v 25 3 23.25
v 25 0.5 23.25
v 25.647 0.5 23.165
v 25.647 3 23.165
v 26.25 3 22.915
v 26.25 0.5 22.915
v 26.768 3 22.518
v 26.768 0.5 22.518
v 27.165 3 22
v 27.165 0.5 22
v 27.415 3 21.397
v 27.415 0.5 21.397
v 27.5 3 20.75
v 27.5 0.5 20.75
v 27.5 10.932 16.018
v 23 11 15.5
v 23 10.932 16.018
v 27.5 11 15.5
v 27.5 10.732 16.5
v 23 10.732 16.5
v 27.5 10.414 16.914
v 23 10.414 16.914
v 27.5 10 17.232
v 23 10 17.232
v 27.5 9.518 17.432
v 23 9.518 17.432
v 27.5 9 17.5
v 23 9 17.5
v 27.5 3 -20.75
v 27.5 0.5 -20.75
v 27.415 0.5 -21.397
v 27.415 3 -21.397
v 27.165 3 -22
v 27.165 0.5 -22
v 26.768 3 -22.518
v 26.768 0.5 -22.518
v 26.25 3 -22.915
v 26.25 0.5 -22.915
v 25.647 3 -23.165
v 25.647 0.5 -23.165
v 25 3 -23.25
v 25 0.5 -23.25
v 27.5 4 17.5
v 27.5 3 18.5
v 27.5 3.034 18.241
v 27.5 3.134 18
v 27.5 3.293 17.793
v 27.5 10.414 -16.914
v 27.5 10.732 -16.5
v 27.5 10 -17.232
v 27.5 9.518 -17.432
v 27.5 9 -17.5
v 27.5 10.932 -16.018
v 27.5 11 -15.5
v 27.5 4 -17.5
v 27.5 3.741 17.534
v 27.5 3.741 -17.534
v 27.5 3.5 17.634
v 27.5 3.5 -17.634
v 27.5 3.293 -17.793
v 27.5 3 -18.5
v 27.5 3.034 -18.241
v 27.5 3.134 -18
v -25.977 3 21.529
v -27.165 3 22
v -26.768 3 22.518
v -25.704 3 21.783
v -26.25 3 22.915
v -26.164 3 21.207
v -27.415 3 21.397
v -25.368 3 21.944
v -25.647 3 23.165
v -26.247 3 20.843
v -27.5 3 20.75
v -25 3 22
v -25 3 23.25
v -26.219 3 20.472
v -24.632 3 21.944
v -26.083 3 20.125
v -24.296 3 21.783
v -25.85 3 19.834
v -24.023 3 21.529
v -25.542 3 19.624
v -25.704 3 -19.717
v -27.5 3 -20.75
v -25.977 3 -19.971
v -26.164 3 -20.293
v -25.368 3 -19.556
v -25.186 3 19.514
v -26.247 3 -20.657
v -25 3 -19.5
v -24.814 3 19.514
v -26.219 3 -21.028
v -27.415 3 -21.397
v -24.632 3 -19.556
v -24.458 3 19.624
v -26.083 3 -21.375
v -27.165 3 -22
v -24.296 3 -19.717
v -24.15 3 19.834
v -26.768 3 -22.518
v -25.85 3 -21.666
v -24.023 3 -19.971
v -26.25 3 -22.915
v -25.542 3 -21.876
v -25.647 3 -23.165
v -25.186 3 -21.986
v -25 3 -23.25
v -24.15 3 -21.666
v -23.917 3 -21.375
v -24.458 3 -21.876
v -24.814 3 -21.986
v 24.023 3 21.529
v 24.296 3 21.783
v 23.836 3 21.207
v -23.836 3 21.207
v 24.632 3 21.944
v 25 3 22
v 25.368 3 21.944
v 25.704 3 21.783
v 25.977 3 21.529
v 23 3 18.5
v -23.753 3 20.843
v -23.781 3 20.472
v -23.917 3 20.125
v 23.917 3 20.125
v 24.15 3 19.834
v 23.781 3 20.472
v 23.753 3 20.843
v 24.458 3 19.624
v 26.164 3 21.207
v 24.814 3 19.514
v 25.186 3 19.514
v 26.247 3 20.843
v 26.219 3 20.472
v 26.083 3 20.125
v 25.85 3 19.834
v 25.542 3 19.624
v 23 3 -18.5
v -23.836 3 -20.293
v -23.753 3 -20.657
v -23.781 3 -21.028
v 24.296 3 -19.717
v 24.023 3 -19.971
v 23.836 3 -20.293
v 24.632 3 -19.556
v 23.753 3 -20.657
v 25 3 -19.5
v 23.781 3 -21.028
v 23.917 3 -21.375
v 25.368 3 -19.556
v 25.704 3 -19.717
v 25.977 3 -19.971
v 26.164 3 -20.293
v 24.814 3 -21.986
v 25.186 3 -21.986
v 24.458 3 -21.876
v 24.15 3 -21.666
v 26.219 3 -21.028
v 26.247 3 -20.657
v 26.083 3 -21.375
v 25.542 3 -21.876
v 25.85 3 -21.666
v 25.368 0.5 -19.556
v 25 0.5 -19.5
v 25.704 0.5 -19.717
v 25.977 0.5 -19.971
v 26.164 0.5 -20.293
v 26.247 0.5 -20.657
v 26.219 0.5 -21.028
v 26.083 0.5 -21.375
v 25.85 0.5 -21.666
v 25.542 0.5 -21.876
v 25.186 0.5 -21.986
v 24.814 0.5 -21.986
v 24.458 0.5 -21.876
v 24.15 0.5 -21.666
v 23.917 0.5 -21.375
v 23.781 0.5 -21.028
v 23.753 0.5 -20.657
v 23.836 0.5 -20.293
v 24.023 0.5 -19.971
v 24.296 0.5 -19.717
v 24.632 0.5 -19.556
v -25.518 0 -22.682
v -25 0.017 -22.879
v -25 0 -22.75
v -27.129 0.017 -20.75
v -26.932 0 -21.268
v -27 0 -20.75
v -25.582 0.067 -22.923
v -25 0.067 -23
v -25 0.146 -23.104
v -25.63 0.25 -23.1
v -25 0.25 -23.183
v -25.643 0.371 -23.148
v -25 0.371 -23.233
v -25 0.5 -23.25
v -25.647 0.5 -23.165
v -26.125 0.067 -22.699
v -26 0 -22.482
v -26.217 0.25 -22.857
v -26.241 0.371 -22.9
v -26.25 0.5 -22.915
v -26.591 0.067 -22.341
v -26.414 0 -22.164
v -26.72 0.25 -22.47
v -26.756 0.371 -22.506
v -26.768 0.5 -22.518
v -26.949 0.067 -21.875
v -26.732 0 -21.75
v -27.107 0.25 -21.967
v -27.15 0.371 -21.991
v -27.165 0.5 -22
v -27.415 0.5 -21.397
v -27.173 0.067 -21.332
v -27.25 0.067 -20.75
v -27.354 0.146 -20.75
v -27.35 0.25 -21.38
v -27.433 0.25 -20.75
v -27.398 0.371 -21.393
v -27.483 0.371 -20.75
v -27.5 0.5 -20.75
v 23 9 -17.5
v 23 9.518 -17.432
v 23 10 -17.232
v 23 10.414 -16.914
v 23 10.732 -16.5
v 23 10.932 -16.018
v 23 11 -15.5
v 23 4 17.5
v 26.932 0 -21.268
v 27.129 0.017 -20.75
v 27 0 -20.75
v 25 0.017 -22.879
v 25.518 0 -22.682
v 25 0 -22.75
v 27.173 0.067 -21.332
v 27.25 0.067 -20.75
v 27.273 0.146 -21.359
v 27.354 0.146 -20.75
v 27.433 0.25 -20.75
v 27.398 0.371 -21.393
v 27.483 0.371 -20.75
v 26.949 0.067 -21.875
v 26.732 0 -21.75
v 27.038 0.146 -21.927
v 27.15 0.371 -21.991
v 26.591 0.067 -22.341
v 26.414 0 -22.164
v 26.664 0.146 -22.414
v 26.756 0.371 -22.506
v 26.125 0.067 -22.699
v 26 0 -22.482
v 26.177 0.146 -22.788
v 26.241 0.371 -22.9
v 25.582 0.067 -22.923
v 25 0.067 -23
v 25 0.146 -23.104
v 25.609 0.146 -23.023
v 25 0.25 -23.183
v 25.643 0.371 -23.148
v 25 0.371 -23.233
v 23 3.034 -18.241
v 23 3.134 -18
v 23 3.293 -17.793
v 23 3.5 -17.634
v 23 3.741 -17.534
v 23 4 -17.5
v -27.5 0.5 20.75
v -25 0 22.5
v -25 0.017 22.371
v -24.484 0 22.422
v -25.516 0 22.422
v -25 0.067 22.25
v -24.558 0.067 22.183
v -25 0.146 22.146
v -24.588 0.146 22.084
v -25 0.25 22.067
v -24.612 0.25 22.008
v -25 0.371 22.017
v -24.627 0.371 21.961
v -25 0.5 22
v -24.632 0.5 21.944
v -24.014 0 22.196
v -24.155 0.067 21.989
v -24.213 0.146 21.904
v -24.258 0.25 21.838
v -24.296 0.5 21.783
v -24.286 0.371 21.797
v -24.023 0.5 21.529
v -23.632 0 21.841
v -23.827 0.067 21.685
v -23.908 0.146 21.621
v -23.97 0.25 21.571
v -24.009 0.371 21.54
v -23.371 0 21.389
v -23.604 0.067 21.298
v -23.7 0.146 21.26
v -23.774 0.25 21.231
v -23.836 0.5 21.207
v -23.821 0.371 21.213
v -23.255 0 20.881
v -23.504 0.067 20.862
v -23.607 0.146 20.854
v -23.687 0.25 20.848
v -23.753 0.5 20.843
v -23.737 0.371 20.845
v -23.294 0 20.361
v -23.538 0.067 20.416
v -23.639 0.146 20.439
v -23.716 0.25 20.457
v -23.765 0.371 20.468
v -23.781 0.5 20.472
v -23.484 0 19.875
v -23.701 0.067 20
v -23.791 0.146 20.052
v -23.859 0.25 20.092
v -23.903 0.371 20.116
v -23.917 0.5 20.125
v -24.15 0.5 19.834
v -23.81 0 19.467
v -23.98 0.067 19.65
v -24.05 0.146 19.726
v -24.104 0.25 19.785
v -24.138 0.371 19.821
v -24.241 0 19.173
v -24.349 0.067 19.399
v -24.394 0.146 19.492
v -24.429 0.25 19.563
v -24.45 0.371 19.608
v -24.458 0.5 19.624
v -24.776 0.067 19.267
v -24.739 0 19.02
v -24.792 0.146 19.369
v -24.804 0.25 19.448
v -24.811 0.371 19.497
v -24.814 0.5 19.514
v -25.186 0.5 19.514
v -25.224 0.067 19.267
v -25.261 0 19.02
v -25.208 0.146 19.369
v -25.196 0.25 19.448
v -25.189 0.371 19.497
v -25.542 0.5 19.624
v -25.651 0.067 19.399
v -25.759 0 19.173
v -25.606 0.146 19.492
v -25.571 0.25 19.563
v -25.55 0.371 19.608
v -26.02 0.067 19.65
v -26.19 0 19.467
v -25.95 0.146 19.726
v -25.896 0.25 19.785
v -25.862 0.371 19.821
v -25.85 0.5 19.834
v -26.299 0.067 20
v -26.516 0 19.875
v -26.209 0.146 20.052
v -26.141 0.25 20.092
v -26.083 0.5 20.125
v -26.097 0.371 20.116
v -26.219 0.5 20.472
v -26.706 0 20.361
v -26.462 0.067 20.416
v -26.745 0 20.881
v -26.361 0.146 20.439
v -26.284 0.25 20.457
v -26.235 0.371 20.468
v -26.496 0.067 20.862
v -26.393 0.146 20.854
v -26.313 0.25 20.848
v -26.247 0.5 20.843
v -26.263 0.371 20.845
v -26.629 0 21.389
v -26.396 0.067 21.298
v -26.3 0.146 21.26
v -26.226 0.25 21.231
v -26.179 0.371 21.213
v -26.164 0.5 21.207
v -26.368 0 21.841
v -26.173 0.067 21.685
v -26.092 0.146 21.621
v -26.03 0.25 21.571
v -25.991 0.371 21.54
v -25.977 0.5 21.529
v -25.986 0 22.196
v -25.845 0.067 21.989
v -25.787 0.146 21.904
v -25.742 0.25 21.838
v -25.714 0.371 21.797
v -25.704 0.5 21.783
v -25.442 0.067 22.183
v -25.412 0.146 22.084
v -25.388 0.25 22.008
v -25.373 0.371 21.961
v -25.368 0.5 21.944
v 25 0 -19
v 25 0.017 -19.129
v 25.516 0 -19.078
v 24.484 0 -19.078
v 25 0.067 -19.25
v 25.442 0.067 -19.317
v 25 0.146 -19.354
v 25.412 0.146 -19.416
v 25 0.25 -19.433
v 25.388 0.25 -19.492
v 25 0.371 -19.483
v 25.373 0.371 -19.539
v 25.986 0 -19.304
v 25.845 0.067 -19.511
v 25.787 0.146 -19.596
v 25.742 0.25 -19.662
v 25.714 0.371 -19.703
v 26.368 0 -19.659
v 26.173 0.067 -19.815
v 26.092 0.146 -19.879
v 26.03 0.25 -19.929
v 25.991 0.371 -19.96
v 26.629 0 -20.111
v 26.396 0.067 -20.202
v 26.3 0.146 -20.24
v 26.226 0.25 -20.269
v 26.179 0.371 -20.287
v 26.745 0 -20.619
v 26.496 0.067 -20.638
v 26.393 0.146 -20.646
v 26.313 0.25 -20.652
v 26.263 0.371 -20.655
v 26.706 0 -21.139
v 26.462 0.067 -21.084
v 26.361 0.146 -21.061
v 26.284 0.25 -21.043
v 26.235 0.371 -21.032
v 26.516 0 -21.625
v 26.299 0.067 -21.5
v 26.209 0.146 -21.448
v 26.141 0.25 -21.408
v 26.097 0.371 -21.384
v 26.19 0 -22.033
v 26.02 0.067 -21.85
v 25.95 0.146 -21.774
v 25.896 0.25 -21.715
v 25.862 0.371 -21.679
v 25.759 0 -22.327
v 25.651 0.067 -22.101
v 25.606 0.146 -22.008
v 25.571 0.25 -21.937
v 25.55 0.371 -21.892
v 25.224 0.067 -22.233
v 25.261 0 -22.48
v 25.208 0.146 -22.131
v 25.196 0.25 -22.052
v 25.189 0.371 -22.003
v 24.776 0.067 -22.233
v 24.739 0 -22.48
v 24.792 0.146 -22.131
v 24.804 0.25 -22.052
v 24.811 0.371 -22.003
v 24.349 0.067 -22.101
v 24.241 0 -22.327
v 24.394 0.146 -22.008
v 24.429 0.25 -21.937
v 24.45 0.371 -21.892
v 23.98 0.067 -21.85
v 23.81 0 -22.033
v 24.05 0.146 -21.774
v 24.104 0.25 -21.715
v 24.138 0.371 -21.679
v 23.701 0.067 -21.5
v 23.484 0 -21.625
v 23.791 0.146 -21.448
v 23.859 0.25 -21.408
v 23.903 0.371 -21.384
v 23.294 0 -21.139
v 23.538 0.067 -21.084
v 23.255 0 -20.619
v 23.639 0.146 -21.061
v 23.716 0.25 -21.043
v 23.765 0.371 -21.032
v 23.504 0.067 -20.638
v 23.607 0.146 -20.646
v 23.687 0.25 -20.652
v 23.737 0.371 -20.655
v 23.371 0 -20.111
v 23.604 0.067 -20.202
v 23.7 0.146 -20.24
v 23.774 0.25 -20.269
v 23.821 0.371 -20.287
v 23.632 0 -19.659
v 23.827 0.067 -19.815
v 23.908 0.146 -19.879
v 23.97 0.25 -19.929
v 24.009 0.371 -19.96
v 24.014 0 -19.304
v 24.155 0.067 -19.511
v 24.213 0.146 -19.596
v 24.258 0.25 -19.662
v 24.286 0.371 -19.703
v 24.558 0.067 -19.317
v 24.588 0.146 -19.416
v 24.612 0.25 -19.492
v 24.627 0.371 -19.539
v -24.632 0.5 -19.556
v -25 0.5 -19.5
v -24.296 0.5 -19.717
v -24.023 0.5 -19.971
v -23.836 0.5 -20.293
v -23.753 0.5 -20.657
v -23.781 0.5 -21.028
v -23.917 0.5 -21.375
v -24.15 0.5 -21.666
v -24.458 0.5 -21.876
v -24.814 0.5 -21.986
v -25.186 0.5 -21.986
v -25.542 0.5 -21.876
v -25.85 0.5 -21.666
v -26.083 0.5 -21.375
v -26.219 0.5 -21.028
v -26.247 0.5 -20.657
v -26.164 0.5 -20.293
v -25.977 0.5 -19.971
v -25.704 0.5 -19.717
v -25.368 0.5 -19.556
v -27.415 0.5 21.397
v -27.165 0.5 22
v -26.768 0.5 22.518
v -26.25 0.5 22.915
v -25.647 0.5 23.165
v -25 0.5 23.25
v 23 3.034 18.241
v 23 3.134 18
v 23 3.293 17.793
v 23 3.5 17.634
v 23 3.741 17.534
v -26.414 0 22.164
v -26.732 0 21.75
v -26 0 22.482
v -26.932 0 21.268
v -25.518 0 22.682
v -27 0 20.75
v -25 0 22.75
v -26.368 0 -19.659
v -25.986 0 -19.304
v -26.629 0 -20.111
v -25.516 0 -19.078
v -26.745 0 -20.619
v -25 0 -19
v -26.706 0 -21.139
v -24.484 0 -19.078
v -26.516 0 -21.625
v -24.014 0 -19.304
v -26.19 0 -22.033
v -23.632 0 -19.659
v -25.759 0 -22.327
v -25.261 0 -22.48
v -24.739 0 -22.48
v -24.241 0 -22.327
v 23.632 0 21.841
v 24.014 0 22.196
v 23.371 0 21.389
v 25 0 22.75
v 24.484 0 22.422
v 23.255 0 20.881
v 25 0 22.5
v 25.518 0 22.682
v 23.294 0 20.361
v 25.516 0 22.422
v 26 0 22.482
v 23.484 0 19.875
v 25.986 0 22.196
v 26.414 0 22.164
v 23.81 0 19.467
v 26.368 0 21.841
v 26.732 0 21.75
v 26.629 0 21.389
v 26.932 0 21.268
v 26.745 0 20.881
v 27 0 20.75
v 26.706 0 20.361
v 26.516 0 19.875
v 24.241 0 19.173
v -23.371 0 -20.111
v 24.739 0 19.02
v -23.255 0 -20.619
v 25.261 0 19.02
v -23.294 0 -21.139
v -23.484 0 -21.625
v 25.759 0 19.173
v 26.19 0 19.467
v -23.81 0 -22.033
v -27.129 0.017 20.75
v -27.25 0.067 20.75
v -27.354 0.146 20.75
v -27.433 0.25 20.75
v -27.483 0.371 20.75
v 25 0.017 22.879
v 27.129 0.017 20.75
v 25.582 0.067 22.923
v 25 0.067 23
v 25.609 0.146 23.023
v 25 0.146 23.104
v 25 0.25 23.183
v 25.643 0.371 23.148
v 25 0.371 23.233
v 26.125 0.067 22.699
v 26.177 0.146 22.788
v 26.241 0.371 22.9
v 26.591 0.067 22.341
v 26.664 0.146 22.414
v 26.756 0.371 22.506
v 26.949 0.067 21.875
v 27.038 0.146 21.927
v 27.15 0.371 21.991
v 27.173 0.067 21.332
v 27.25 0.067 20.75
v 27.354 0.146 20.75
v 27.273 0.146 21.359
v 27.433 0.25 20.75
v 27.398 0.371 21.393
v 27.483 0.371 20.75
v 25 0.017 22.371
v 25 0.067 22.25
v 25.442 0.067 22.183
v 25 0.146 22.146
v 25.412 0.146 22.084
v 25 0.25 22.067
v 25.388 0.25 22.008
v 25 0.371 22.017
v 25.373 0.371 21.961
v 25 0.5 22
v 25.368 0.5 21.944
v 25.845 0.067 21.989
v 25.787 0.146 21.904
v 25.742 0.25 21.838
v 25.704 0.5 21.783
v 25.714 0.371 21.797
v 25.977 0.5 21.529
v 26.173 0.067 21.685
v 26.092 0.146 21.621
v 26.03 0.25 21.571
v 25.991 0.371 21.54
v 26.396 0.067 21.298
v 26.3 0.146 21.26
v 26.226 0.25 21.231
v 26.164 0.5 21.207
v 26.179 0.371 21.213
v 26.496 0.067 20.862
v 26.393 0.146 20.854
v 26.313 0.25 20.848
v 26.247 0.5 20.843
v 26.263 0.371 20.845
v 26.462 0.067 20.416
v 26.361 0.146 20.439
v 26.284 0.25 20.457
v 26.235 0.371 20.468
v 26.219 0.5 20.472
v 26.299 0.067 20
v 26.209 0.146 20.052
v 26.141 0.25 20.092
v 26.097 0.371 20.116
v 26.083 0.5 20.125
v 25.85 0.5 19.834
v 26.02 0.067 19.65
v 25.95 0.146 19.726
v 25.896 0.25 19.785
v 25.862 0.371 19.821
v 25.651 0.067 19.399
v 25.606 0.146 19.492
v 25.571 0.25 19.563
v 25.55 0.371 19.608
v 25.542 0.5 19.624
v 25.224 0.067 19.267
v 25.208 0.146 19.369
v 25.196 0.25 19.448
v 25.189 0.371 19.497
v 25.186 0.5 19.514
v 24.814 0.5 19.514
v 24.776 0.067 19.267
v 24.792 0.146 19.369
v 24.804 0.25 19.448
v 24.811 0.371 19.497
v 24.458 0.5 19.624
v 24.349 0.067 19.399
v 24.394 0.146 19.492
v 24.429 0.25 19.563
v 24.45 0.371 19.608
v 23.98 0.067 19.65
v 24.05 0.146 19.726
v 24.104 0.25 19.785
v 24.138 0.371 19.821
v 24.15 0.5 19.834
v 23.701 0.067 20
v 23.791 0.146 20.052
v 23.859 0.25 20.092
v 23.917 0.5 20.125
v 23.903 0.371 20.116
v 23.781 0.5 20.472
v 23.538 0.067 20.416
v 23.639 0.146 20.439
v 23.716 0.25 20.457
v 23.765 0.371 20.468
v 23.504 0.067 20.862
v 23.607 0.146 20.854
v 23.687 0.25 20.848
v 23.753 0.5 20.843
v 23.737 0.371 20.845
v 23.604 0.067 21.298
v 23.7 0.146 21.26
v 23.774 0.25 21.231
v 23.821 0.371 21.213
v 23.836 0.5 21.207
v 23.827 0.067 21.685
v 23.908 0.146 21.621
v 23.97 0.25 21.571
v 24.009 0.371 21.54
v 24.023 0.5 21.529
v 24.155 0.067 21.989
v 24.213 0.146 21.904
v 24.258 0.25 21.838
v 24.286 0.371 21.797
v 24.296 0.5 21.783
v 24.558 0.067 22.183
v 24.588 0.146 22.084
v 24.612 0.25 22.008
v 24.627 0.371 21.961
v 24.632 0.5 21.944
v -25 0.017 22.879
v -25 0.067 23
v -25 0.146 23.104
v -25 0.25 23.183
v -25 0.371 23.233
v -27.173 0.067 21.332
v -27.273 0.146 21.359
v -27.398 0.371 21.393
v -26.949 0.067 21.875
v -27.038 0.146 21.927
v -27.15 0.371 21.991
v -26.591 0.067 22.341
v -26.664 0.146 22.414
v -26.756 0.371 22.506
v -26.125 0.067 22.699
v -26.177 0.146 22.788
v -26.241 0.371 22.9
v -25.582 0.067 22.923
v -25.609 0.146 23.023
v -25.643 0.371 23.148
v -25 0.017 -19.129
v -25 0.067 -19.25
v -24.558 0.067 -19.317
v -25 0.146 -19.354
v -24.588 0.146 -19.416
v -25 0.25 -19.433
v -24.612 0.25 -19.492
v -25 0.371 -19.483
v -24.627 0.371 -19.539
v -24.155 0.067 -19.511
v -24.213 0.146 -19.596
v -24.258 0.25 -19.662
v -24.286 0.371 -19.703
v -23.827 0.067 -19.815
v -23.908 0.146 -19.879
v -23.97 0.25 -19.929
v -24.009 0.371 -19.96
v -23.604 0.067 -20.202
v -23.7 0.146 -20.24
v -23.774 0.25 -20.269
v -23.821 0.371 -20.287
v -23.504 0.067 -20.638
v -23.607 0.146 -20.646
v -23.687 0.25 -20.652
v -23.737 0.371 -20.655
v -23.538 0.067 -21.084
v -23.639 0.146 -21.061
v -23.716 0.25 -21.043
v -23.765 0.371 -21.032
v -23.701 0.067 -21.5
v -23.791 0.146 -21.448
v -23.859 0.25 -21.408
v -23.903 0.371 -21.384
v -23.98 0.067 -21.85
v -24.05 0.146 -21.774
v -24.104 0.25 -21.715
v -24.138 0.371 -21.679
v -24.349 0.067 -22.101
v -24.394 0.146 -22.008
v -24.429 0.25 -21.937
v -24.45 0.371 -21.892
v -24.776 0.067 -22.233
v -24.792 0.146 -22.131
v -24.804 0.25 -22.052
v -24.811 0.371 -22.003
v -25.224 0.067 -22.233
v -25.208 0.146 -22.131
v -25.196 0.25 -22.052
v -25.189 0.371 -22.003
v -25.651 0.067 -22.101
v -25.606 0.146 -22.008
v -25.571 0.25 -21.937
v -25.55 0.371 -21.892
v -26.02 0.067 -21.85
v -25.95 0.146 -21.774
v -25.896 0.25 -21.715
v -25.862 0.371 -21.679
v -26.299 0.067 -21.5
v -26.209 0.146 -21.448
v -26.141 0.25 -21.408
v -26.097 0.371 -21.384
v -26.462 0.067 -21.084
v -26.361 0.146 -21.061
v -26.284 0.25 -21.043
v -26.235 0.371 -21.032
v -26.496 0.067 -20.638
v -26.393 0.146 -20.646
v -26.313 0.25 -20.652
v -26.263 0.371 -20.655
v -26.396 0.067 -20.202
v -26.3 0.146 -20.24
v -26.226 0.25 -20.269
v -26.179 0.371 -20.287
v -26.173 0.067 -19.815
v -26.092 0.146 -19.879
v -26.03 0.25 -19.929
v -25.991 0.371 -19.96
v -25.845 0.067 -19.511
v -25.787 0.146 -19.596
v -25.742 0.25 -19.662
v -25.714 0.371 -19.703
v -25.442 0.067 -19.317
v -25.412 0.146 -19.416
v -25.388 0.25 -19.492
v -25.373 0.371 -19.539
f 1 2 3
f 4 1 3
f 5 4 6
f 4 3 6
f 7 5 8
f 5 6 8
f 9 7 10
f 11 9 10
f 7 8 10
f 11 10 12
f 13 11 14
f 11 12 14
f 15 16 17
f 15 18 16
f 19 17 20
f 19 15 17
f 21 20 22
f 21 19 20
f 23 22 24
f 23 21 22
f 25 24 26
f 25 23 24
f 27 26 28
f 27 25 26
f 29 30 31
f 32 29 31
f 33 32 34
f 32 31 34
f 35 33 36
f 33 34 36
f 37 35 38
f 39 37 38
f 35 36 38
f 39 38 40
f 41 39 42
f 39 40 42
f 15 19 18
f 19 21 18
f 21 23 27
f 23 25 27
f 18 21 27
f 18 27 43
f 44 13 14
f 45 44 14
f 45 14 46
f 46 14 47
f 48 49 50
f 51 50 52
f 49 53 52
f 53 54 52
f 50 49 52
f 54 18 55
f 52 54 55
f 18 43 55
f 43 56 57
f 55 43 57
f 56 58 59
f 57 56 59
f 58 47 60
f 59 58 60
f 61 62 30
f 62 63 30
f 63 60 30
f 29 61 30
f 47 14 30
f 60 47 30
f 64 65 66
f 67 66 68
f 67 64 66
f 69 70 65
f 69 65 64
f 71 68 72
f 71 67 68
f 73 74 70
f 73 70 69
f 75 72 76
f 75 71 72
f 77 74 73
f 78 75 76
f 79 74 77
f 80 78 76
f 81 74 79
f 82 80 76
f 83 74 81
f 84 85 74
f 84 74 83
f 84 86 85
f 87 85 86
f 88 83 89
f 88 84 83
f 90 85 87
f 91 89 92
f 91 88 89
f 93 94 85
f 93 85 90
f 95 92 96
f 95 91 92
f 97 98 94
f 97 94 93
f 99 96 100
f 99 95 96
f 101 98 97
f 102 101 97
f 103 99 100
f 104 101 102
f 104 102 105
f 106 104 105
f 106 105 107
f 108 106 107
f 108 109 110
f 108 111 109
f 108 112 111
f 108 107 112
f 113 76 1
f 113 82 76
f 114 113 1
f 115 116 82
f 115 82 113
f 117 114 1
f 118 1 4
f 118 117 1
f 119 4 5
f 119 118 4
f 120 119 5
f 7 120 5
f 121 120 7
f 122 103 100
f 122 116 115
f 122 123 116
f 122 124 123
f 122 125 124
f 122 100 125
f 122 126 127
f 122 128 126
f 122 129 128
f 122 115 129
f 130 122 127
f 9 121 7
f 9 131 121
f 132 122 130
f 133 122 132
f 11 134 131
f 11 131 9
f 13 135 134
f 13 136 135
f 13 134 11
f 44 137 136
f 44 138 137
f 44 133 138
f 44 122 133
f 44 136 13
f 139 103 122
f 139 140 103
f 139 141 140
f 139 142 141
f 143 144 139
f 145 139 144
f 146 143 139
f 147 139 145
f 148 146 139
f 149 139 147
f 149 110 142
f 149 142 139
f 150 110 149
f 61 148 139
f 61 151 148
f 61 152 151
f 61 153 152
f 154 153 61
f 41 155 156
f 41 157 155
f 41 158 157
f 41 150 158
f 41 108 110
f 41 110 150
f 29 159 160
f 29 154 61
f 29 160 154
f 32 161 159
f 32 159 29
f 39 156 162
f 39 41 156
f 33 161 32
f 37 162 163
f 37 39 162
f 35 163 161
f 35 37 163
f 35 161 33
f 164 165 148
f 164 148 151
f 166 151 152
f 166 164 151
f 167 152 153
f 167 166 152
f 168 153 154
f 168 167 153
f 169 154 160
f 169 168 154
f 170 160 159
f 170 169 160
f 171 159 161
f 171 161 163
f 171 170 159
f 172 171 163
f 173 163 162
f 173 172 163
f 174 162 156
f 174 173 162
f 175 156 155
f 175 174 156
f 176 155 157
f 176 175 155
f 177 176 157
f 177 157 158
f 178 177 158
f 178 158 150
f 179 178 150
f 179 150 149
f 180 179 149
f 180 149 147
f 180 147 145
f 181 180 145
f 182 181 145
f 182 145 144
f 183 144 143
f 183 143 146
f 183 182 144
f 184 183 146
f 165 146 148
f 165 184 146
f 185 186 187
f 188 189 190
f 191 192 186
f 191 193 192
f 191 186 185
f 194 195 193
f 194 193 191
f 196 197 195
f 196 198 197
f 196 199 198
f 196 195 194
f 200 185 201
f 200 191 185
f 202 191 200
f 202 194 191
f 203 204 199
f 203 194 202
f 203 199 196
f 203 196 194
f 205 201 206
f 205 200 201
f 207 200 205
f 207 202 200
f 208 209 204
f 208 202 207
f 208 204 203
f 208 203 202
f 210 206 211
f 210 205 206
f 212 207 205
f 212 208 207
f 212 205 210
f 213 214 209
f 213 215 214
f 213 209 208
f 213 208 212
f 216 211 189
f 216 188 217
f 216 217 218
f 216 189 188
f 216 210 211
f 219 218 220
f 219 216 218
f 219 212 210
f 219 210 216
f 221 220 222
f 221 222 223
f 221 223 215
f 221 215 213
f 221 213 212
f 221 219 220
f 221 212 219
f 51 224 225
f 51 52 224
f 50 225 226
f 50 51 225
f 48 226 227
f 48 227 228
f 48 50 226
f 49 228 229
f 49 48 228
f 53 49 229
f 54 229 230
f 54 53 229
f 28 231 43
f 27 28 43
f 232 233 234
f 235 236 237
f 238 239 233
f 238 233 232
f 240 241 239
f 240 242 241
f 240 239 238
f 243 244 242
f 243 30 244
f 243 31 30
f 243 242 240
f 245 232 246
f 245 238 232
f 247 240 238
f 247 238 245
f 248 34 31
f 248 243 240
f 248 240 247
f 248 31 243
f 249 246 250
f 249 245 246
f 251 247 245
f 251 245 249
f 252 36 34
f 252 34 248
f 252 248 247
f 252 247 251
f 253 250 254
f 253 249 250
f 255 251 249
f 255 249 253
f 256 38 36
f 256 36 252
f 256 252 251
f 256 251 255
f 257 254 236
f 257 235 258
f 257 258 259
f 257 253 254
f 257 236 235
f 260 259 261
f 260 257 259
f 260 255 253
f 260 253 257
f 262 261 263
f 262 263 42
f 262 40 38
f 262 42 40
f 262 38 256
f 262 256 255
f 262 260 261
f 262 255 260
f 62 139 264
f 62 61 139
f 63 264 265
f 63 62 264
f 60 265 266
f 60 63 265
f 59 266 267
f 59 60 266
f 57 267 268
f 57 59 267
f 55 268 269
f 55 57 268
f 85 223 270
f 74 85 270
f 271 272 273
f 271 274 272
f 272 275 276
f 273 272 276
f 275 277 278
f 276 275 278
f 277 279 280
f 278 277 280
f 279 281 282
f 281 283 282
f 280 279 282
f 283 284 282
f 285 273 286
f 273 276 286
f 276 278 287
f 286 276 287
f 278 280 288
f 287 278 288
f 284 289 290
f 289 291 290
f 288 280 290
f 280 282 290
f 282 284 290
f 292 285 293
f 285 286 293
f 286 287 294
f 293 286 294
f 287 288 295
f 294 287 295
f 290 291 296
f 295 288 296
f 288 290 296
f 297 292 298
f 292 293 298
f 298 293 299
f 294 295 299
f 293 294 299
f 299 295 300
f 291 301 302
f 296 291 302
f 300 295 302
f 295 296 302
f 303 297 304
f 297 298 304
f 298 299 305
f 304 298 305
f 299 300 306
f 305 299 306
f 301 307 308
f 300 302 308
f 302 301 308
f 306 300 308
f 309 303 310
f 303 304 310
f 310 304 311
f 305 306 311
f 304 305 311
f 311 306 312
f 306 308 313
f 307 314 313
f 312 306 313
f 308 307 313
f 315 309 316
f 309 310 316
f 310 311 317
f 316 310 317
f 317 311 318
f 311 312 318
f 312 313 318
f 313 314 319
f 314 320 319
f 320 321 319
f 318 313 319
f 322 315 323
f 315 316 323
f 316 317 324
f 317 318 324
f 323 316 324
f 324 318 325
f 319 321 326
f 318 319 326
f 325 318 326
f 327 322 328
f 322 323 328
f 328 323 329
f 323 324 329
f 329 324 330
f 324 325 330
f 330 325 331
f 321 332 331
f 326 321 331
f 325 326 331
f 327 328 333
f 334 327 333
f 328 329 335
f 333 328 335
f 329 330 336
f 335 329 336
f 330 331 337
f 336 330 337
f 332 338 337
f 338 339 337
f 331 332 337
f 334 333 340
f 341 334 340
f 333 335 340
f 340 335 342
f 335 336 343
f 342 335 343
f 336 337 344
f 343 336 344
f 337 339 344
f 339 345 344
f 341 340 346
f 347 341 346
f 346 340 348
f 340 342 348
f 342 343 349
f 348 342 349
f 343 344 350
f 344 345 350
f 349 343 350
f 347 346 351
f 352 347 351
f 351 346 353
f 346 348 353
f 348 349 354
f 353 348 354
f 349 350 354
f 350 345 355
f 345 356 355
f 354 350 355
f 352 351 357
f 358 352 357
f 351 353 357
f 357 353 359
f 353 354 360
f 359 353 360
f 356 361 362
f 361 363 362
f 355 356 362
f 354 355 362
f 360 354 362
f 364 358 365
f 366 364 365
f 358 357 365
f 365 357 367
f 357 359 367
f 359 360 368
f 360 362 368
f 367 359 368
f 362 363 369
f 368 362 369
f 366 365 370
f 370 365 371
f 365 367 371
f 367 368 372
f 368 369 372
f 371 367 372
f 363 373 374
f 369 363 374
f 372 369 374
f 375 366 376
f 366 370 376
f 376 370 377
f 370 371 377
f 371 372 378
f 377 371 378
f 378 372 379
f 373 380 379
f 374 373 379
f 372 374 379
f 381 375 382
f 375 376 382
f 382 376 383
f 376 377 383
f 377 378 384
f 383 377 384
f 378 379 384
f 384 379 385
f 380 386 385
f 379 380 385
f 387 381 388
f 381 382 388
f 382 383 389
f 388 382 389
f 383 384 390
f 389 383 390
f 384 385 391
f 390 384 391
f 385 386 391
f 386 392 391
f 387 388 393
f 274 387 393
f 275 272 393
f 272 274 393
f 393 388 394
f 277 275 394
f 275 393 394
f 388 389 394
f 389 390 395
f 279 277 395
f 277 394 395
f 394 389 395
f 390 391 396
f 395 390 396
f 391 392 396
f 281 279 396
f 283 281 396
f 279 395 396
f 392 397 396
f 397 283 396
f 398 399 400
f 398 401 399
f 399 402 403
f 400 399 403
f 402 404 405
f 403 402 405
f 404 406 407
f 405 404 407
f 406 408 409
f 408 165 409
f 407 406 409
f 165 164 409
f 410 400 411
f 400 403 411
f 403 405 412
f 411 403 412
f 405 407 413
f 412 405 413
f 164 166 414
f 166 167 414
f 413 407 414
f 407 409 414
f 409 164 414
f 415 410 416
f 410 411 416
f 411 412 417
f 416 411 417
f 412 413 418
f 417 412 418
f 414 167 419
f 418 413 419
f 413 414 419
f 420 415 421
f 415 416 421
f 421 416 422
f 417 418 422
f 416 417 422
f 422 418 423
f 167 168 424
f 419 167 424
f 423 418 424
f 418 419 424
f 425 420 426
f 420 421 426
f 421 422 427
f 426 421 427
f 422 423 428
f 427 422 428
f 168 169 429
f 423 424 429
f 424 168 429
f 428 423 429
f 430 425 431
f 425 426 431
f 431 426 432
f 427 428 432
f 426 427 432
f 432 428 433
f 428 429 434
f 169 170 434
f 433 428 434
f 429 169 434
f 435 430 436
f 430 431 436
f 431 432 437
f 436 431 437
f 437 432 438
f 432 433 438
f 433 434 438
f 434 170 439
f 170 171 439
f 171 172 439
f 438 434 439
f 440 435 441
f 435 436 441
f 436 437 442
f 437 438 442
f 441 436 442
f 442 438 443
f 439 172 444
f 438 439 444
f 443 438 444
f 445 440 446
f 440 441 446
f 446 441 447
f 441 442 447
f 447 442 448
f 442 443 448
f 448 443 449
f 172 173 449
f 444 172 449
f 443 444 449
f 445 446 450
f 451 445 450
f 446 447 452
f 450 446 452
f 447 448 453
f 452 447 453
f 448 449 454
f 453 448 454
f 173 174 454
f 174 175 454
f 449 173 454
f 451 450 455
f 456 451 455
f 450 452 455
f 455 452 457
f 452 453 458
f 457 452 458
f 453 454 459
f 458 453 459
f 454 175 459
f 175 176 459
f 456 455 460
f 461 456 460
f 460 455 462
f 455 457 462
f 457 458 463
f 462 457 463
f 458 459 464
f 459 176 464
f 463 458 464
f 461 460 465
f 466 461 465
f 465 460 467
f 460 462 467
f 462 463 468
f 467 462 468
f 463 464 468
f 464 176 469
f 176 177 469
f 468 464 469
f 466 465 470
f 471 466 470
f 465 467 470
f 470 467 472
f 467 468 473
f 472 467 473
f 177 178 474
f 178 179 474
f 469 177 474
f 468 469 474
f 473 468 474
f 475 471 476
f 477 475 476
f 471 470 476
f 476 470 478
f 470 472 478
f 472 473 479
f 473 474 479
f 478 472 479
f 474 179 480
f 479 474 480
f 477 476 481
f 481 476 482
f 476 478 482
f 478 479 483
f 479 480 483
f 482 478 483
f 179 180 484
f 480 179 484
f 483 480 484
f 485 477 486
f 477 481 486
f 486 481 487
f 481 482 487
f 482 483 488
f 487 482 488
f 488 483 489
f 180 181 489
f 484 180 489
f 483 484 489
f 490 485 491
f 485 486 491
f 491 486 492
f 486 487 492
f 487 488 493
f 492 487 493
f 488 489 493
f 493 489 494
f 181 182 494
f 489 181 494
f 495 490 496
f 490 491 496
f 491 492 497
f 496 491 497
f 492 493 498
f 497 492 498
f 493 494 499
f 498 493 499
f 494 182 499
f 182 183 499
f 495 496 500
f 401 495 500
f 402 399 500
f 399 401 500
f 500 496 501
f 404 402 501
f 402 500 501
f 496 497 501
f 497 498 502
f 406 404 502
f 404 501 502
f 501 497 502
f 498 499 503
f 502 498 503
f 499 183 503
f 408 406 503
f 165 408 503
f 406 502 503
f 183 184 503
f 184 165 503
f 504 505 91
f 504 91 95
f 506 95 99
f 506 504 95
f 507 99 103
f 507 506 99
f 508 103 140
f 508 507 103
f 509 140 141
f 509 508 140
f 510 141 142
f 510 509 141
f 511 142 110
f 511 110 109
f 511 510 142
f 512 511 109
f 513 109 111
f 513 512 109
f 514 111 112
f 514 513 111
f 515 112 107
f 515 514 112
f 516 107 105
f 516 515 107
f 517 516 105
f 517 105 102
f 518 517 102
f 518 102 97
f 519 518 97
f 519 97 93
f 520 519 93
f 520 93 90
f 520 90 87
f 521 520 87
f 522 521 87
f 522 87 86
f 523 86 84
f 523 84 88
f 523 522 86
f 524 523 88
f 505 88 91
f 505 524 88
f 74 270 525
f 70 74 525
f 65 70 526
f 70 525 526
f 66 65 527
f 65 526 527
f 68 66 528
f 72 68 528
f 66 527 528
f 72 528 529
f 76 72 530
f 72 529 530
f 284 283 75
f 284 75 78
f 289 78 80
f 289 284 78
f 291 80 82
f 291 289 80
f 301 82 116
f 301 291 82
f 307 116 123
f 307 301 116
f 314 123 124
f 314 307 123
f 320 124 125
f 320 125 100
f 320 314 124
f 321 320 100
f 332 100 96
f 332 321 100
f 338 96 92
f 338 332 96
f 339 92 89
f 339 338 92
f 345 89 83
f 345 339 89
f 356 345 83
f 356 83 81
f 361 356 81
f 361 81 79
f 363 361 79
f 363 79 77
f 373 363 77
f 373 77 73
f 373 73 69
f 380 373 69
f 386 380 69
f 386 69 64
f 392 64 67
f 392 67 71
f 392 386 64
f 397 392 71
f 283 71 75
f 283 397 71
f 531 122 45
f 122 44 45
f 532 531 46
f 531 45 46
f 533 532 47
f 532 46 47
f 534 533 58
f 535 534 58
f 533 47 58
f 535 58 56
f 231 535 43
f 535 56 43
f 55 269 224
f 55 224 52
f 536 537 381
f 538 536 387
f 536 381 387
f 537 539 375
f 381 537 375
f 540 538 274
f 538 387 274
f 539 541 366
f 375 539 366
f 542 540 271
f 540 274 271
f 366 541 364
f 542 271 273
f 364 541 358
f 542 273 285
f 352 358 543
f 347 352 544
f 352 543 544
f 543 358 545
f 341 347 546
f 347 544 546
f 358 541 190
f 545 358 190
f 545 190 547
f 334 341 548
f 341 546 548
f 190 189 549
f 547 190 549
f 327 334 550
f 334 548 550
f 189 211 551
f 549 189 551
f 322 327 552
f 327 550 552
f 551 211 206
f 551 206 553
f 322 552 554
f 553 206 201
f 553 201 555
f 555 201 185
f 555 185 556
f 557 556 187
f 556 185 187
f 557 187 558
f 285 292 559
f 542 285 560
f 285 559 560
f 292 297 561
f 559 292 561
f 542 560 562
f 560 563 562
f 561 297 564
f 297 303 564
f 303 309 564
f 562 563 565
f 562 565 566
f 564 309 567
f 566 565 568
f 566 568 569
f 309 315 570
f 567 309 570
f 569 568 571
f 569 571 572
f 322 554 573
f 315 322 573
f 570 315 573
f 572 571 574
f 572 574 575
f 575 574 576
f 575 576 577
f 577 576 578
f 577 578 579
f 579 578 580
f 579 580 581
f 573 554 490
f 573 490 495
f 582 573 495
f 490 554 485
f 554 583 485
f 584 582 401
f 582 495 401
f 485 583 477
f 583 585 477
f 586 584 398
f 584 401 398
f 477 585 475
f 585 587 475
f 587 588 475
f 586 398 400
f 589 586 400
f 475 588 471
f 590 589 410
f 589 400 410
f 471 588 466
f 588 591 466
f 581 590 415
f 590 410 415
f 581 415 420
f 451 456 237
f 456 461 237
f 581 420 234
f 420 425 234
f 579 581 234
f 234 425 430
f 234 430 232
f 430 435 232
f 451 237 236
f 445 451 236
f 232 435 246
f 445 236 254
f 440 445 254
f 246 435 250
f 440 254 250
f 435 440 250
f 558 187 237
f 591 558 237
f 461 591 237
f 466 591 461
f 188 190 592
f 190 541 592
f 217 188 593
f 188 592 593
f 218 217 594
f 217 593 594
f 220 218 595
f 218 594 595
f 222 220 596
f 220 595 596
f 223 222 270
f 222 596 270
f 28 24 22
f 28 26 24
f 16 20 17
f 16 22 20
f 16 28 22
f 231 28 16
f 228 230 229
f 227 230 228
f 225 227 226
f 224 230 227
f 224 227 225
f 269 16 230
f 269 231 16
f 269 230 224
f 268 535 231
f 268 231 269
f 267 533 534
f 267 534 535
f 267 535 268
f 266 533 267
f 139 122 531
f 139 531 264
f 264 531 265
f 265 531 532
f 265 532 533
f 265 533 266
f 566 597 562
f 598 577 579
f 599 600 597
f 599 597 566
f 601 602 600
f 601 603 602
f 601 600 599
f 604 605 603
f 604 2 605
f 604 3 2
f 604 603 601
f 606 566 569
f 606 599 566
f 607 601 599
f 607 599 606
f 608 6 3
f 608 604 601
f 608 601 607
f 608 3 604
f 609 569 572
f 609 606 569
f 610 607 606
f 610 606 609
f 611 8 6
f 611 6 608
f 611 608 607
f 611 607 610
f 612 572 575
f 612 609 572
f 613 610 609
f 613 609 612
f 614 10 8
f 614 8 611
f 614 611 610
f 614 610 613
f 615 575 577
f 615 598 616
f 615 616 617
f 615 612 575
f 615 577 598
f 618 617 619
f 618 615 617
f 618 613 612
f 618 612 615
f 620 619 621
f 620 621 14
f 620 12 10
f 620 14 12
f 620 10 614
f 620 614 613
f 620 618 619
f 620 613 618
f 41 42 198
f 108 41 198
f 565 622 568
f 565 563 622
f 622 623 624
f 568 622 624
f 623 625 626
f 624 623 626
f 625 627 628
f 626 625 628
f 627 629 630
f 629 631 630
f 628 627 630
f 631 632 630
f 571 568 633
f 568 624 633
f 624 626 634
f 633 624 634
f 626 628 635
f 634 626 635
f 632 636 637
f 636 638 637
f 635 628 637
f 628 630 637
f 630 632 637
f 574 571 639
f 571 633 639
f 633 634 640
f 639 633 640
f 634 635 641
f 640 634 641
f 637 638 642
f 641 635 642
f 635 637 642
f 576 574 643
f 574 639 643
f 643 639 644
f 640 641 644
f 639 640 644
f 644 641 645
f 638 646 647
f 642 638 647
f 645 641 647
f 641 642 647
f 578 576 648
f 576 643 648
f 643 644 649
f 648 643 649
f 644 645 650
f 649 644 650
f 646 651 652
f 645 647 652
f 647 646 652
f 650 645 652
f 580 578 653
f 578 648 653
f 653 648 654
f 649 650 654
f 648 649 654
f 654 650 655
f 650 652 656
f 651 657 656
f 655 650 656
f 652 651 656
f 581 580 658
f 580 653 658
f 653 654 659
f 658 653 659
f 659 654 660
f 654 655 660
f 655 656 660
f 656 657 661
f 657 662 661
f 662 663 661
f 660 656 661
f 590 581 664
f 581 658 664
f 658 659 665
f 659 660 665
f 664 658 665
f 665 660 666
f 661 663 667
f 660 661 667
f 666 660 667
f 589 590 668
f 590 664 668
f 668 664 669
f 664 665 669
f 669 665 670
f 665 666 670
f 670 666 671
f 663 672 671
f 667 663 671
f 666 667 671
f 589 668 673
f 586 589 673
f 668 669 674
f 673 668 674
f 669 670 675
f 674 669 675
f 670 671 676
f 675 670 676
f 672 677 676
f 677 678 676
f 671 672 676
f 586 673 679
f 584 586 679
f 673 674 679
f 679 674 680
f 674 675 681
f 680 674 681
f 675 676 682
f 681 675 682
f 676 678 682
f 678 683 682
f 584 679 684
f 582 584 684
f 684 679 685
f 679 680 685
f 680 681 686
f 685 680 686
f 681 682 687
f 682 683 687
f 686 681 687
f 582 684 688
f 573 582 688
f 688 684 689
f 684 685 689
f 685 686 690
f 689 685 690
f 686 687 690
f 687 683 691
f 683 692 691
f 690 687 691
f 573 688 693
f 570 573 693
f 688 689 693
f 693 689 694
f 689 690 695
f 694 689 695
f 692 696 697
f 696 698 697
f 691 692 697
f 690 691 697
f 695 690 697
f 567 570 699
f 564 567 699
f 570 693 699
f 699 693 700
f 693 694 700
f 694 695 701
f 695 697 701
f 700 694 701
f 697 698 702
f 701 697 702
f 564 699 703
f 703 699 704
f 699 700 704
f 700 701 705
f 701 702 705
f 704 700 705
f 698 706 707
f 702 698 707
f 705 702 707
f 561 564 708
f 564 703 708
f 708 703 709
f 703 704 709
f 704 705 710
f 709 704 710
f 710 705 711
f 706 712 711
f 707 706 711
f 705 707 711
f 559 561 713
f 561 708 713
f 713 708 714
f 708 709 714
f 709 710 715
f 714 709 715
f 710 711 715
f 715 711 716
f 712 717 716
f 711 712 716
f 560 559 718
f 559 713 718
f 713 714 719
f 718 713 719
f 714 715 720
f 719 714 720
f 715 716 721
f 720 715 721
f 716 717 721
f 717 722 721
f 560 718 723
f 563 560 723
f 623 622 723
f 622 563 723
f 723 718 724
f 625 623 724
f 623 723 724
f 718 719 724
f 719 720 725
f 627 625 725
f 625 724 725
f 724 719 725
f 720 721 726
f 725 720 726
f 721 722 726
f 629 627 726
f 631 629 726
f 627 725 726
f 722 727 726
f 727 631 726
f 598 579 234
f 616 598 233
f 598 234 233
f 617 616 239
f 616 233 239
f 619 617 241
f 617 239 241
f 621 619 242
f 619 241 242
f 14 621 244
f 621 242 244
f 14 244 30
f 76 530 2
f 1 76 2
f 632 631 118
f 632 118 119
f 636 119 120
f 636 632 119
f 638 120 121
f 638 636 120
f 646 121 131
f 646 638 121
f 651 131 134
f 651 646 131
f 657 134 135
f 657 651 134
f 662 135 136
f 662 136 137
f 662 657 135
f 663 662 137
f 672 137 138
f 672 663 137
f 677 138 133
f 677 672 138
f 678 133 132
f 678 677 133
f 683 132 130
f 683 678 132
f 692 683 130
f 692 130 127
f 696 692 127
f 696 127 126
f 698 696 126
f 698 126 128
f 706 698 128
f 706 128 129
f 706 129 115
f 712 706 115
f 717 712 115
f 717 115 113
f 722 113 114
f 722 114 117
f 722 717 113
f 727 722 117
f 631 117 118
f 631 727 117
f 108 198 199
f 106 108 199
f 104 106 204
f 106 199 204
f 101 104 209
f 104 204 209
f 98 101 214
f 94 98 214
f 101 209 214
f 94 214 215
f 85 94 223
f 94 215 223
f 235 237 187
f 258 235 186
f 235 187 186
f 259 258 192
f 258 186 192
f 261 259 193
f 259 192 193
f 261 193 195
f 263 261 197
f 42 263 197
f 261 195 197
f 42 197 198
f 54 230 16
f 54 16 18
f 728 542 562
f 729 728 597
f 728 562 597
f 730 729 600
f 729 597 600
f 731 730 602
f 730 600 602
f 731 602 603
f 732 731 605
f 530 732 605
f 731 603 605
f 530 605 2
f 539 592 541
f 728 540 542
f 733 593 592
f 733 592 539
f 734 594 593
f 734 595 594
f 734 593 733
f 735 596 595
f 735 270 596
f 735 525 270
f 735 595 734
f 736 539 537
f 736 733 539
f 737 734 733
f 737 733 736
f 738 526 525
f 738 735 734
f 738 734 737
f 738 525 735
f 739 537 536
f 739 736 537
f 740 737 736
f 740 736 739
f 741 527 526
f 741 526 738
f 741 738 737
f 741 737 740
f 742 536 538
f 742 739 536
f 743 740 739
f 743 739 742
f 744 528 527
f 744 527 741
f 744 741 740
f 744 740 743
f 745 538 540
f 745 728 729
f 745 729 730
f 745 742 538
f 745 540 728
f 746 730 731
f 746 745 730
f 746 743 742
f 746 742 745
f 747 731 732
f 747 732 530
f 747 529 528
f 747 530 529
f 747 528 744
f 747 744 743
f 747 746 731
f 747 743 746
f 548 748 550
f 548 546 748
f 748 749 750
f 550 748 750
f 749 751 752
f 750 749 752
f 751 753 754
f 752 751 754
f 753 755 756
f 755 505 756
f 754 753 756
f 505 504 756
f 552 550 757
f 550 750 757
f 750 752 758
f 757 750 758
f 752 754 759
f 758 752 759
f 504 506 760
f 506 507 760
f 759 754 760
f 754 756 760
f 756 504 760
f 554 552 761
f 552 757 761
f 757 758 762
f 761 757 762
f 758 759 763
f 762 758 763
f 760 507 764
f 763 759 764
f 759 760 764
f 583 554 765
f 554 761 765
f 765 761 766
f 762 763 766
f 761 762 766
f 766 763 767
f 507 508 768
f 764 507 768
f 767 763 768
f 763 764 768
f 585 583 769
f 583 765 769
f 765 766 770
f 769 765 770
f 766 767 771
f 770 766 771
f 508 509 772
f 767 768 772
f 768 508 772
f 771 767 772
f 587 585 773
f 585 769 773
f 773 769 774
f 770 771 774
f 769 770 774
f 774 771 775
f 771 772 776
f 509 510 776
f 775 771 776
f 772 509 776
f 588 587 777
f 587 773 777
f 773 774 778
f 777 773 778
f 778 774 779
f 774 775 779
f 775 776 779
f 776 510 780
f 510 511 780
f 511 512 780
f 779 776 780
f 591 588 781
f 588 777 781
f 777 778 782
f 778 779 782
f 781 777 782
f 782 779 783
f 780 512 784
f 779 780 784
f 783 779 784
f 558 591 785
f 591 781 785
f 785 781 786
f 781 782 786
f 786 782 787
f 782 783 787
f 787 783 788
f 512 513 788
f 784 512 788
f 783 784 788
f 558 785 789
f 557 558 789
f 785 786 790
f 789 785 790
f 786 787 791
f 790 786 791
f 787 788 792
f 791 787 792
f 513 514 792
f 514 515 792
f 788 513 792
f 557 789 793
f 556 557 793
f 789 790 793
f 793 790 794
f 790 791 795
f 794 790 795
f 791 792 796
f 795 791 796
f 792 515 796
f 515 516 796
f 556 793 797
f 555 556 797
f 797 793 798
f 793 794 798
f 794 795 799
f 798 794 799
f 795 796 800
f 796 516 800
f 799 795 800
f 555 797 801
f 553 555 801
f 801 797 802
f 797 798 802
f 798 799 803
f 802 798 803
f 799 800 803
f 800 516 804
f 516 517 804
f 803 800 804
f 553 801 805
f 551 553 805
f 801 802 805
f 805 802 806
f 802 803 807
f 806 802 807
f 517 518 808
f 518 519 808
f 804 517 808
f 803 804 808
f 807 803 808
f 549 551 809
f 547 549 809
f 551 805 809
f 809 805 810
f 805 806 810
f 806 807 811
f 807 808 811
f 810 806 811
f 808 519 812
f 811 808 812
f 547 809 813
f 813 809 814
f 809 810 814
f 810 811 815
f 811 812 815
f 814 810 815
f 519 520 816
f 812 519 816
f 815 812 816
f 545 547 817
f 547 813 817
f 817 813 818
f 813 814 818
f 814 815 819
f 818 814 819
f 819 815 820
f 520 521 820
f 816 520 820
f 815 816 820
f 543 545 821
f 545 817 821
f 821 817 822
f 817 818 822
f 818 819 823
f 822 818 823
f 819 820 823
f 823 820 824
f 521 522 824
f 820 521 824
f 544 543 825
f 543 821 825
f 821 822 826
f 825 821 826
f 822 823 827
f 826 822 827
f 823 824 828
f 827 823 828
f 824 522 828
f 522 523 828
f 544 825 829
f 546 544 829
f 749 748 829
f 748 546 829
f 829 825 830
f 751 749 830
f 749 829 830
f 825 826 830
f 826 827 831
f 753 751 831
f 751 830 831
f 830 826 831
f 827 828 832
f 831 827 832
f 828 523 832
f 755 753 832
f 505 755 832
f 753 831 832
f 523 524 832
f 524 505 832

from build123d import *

# Parameters (mm, degrees)
SKETCH1_R           = 1.25
BOSS_EXTRUDE1_DEPTH = 3
SKETCH2_W           = 4.5
SKETCH2_H           = 35
BOSS_EXTRUDE2_DEPTH = 8
FILLET1_R           = 1
FILLET2_R           = 2
FILLET3_R           = 0.5


with BuildPart() as part:
    # Sketch1 → Boss-Extrude1 (new body)
    with BuildSketch(Plane(origin=(0, 0, 0), x_dir=(1, 0, 0), z_dir=(0, 1, 0))):
        with BuildLine():
            Line((-27.5, -19.25), (-27.5, -20.75))
            ThreePointArc((-27.5, -20.75), (-26.767766953, -22.517766953), (-25, -23.25))
            Line((-25, -23.25), (25, -23.25))
            ThreePointArc((25, -23.25), (26.767766953, -22.517766953), (27.5, -20.75))
            Line((27.5, -20.75), (27.5, 20.75))
            ThreePointArc((27.5, 20.75), (26.767766953, 22.517766953), (25, 23.25))
            Line((25, 23.25), (-25, 23.25))
            ThreePointArc((-25, 23.25), (-26.767766953, 22.517766953), (-27.5, 20.75))
            Line((-27.5, 20.75), (-27.5, 19.25))
            Line((-27.5, 19.25), (-27.5, -19.25))
        make_face()
        with Locations(Location((-25, -20.75, 0), (0, 0, 270))):
            Circle(SKETCH1_R, mode=Mode.SUBTRACT)
        with Locations(Location((25, -20.75, 0), (0, 0, 270))):
            Circle(SKETCH1_R, mode=Mode.SUBTRACT)
        with Locations(Location((25, 20.75, 0), (0, 0, 270))):
            Circle(SKETCH1_R, mode=Mode.SUBTRACT)
        with Locations(Location((-25, 20.75, 0), (0, 0, 270))):
            Circle(SKETCH1_R, mode=Mode.SUBTRACT)
    extrude(amount=BOSS_EXTRUDE1_DEPTH)

    # Sketch2 → Boss-Extrude2 (add)
    with BuildSketch(Plane(origin=(0, 3, 0), x_dir=(1, 0, 0), z_dir=(0, 1, 0))):
        with Locations((25.25, 0)):
            Rectangle(SKETCH2_W, SKETCH2_H)
    extrude(amount=BOSS_EXTRUDE2_DEPTH)

    # Fillet1
    fillet1_edges = [part.edges().sort_by_distance(p)[0] for p in [
        (25.25, 3, -17.5),
        (25.25, 3, 17.5),
    ]]
    fillet(fillet1_edges, radius=FILLET1_R)

    # Fillet2
    fillet2_edges = [part.edges().sort_by_distance(p)[0] for p in [
        (25.25, 11, -17.5),
        (25.25, 11, 17.5),
    ]]
    fillet(fillet2_edges, radius=FILLET2_R)

    # Fillet3
    fillet3_edges = [part.edges().sort_by_distance(p)[0] for p in [
        (-27.5, 0, 0),
        (-26.767766953, 0, -22.517766953),
        (0, 0, -23.25),
        (26.767766953, 0, -22.517766953),
        (27.5, 0, 0),
        (26.767766953, 0, 22.517766953),
        (0, 0, 23.25),
        (-26.767766953, 0, 22.517766953),
        (-25, 0, 19.5),
        (25, 0, 19.5),
        (25, 0, -22),
        (-25, 0, -22),
    ]]
    fillet(fillet3_edges, radius=FILLET3_R)


solid = part.part
